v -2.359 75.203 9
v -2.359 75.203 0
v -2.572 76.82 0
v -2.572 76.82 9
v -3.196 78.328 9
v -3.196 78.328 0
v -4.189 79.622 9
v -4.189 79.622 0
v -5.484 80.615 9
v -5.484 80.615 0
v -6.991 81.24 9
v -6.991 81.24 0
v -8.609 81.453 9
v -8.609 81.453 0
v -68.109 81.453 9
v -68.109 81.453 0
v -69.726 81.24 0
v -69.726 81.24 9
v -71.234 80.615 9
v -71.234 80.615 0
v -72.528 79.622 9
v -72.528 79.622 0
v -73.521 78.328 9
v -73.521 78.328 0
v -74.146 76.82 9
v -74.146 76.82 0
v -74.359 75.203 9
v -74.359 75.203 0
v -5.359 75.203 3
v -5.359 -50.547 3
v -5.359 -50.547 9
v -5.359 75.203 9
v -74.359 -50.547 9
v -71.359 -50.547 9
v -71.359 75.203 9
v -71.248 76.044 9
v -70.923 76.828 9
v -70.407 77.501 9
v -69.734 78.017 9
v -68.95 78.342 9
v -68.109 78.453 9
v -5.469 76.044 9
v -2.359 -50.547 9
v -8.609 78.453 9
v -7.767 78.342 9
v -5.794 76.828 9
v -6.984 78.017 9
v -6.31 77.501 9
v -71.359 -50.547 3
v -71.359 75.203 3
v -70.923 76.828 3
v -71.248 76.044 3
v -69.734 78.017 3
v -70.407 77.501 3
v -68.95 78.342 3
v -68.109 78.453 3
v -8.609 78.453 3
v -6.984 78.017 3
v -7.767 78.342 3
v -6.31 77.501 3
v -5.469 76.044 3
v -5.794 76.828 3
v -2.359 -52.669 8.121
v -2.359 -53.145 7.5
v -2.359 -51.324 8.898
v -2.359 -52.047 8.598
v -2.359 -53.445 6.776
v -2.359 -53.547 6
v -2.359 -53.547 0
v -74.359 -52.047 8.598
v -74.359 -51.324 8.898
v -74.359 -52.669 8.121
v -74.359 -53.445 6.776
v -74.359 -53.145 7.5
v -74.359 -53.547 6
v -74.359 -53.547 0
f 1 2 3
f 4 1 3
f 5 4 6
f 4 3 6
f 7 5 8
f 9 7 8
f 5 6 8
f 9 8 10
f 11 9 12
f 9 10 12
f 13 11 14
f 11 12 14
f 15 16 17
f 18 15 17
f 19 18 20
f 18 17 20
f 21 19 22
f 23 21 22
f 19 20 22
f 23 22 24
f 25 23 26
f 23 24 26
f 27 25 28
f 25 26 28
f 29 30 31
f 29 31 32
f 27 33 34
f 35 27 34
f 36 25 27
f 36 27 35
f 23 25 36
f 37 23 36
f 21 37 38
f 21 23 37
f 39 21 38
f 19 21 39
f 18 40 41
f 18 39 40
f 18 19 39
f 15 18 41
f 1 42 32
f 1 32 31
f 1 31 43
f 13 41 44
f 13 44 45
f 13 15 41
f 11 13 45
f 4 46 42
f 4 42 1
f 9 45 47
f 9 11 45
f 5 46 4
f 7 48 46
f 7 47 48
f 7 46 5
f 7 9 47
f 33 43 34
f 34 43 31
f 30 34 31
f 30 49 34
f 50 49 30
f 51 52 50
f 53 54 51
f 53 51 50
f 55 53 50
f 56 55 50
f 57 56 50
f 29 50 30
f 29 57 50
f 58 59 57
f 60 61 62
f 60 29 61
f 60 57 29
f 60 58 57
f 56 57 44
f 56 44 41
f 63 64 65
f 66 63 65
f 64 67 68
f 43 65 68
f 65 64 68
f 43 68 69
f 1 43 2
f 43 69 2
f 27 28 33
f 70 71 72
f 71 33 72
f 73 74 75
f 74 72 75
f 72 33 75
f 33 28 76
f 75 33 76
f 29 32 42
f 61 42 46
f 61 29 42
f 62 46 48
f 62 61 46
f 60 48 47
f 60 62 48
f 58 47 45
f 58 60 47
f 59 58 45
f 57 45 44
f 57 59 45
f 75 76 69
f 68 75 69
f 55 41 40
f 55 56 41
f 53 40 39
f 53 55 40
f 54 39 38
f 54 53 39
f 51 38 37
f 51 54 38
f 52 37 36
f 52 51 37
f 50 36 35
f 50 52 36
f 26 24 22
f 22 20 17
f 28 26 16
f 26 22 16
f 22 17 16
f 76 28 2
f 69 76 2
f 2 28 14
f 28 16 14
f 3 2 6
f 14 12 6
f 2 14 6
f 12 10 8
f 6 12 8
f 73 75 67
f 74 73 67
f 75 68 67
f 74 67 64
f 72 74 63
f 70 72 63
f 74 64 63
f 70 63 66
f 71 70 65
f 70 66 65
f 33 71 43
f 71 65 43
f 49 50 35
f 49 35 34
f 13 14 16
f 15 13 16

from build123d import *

# Parameters (mm, degrees)
F1_DEPTH = 9
F2_T     = -3
F3_R     = 2.99999


# Not quite as in the source:
# - a fillet or chamfer is up to 0.001 mm smaller than in the source, because OpenCascade refuses the exact size


with BuildPart() as f1:
    # F0 (on Top) → F1 (new body)
    with BuildSketch(Plane.XY):
        with BuildLine():
            Line((-74.3585927405, 75.2026882768), (-74.3585927405, -53.5473117232))
            Line((-74.3585927405, -53.5473117232), (-2.3585927405, -53.5473117232))
            Line((-2.3585927405, -53.5473117232), (-2.3585927405, 75.2026882768))
            ThreePointArc((-2.3585927405, 75.2026882768), (-4.189175358, 79.6221056592), (-8.6085927405, 81.4526882768))
            Line((-8.6085927405, 81.4526882768), (-68.1085927405, 81.4526882768))
            ThreePointArc((-68.1085927405, 81.4526882768), (-72.5280101229, 79.6221056592), (-74.3585927405, 75.2026882768))
        make_face()
    extrude(amount=F1_DEPTH)

    # F2
    f2_openings = [f1.faces().sort_by_distance(p)[0] for p in [
        (-38.358593, 13.83847, 9),
    ]]
    offset(amount=F2_T, openings=f2_openings)

    # F3 (radius 3 in the source; OpenCascade refuses exactly that, so slightly less here)
    f3_edges = [f1.edges().sort_by_distance(p)[0] for p in [
        (-38.358593, -53.547312, 9),
    ]]
    fillet(f3_edges, radius=F3_R)


solid = f1.part
